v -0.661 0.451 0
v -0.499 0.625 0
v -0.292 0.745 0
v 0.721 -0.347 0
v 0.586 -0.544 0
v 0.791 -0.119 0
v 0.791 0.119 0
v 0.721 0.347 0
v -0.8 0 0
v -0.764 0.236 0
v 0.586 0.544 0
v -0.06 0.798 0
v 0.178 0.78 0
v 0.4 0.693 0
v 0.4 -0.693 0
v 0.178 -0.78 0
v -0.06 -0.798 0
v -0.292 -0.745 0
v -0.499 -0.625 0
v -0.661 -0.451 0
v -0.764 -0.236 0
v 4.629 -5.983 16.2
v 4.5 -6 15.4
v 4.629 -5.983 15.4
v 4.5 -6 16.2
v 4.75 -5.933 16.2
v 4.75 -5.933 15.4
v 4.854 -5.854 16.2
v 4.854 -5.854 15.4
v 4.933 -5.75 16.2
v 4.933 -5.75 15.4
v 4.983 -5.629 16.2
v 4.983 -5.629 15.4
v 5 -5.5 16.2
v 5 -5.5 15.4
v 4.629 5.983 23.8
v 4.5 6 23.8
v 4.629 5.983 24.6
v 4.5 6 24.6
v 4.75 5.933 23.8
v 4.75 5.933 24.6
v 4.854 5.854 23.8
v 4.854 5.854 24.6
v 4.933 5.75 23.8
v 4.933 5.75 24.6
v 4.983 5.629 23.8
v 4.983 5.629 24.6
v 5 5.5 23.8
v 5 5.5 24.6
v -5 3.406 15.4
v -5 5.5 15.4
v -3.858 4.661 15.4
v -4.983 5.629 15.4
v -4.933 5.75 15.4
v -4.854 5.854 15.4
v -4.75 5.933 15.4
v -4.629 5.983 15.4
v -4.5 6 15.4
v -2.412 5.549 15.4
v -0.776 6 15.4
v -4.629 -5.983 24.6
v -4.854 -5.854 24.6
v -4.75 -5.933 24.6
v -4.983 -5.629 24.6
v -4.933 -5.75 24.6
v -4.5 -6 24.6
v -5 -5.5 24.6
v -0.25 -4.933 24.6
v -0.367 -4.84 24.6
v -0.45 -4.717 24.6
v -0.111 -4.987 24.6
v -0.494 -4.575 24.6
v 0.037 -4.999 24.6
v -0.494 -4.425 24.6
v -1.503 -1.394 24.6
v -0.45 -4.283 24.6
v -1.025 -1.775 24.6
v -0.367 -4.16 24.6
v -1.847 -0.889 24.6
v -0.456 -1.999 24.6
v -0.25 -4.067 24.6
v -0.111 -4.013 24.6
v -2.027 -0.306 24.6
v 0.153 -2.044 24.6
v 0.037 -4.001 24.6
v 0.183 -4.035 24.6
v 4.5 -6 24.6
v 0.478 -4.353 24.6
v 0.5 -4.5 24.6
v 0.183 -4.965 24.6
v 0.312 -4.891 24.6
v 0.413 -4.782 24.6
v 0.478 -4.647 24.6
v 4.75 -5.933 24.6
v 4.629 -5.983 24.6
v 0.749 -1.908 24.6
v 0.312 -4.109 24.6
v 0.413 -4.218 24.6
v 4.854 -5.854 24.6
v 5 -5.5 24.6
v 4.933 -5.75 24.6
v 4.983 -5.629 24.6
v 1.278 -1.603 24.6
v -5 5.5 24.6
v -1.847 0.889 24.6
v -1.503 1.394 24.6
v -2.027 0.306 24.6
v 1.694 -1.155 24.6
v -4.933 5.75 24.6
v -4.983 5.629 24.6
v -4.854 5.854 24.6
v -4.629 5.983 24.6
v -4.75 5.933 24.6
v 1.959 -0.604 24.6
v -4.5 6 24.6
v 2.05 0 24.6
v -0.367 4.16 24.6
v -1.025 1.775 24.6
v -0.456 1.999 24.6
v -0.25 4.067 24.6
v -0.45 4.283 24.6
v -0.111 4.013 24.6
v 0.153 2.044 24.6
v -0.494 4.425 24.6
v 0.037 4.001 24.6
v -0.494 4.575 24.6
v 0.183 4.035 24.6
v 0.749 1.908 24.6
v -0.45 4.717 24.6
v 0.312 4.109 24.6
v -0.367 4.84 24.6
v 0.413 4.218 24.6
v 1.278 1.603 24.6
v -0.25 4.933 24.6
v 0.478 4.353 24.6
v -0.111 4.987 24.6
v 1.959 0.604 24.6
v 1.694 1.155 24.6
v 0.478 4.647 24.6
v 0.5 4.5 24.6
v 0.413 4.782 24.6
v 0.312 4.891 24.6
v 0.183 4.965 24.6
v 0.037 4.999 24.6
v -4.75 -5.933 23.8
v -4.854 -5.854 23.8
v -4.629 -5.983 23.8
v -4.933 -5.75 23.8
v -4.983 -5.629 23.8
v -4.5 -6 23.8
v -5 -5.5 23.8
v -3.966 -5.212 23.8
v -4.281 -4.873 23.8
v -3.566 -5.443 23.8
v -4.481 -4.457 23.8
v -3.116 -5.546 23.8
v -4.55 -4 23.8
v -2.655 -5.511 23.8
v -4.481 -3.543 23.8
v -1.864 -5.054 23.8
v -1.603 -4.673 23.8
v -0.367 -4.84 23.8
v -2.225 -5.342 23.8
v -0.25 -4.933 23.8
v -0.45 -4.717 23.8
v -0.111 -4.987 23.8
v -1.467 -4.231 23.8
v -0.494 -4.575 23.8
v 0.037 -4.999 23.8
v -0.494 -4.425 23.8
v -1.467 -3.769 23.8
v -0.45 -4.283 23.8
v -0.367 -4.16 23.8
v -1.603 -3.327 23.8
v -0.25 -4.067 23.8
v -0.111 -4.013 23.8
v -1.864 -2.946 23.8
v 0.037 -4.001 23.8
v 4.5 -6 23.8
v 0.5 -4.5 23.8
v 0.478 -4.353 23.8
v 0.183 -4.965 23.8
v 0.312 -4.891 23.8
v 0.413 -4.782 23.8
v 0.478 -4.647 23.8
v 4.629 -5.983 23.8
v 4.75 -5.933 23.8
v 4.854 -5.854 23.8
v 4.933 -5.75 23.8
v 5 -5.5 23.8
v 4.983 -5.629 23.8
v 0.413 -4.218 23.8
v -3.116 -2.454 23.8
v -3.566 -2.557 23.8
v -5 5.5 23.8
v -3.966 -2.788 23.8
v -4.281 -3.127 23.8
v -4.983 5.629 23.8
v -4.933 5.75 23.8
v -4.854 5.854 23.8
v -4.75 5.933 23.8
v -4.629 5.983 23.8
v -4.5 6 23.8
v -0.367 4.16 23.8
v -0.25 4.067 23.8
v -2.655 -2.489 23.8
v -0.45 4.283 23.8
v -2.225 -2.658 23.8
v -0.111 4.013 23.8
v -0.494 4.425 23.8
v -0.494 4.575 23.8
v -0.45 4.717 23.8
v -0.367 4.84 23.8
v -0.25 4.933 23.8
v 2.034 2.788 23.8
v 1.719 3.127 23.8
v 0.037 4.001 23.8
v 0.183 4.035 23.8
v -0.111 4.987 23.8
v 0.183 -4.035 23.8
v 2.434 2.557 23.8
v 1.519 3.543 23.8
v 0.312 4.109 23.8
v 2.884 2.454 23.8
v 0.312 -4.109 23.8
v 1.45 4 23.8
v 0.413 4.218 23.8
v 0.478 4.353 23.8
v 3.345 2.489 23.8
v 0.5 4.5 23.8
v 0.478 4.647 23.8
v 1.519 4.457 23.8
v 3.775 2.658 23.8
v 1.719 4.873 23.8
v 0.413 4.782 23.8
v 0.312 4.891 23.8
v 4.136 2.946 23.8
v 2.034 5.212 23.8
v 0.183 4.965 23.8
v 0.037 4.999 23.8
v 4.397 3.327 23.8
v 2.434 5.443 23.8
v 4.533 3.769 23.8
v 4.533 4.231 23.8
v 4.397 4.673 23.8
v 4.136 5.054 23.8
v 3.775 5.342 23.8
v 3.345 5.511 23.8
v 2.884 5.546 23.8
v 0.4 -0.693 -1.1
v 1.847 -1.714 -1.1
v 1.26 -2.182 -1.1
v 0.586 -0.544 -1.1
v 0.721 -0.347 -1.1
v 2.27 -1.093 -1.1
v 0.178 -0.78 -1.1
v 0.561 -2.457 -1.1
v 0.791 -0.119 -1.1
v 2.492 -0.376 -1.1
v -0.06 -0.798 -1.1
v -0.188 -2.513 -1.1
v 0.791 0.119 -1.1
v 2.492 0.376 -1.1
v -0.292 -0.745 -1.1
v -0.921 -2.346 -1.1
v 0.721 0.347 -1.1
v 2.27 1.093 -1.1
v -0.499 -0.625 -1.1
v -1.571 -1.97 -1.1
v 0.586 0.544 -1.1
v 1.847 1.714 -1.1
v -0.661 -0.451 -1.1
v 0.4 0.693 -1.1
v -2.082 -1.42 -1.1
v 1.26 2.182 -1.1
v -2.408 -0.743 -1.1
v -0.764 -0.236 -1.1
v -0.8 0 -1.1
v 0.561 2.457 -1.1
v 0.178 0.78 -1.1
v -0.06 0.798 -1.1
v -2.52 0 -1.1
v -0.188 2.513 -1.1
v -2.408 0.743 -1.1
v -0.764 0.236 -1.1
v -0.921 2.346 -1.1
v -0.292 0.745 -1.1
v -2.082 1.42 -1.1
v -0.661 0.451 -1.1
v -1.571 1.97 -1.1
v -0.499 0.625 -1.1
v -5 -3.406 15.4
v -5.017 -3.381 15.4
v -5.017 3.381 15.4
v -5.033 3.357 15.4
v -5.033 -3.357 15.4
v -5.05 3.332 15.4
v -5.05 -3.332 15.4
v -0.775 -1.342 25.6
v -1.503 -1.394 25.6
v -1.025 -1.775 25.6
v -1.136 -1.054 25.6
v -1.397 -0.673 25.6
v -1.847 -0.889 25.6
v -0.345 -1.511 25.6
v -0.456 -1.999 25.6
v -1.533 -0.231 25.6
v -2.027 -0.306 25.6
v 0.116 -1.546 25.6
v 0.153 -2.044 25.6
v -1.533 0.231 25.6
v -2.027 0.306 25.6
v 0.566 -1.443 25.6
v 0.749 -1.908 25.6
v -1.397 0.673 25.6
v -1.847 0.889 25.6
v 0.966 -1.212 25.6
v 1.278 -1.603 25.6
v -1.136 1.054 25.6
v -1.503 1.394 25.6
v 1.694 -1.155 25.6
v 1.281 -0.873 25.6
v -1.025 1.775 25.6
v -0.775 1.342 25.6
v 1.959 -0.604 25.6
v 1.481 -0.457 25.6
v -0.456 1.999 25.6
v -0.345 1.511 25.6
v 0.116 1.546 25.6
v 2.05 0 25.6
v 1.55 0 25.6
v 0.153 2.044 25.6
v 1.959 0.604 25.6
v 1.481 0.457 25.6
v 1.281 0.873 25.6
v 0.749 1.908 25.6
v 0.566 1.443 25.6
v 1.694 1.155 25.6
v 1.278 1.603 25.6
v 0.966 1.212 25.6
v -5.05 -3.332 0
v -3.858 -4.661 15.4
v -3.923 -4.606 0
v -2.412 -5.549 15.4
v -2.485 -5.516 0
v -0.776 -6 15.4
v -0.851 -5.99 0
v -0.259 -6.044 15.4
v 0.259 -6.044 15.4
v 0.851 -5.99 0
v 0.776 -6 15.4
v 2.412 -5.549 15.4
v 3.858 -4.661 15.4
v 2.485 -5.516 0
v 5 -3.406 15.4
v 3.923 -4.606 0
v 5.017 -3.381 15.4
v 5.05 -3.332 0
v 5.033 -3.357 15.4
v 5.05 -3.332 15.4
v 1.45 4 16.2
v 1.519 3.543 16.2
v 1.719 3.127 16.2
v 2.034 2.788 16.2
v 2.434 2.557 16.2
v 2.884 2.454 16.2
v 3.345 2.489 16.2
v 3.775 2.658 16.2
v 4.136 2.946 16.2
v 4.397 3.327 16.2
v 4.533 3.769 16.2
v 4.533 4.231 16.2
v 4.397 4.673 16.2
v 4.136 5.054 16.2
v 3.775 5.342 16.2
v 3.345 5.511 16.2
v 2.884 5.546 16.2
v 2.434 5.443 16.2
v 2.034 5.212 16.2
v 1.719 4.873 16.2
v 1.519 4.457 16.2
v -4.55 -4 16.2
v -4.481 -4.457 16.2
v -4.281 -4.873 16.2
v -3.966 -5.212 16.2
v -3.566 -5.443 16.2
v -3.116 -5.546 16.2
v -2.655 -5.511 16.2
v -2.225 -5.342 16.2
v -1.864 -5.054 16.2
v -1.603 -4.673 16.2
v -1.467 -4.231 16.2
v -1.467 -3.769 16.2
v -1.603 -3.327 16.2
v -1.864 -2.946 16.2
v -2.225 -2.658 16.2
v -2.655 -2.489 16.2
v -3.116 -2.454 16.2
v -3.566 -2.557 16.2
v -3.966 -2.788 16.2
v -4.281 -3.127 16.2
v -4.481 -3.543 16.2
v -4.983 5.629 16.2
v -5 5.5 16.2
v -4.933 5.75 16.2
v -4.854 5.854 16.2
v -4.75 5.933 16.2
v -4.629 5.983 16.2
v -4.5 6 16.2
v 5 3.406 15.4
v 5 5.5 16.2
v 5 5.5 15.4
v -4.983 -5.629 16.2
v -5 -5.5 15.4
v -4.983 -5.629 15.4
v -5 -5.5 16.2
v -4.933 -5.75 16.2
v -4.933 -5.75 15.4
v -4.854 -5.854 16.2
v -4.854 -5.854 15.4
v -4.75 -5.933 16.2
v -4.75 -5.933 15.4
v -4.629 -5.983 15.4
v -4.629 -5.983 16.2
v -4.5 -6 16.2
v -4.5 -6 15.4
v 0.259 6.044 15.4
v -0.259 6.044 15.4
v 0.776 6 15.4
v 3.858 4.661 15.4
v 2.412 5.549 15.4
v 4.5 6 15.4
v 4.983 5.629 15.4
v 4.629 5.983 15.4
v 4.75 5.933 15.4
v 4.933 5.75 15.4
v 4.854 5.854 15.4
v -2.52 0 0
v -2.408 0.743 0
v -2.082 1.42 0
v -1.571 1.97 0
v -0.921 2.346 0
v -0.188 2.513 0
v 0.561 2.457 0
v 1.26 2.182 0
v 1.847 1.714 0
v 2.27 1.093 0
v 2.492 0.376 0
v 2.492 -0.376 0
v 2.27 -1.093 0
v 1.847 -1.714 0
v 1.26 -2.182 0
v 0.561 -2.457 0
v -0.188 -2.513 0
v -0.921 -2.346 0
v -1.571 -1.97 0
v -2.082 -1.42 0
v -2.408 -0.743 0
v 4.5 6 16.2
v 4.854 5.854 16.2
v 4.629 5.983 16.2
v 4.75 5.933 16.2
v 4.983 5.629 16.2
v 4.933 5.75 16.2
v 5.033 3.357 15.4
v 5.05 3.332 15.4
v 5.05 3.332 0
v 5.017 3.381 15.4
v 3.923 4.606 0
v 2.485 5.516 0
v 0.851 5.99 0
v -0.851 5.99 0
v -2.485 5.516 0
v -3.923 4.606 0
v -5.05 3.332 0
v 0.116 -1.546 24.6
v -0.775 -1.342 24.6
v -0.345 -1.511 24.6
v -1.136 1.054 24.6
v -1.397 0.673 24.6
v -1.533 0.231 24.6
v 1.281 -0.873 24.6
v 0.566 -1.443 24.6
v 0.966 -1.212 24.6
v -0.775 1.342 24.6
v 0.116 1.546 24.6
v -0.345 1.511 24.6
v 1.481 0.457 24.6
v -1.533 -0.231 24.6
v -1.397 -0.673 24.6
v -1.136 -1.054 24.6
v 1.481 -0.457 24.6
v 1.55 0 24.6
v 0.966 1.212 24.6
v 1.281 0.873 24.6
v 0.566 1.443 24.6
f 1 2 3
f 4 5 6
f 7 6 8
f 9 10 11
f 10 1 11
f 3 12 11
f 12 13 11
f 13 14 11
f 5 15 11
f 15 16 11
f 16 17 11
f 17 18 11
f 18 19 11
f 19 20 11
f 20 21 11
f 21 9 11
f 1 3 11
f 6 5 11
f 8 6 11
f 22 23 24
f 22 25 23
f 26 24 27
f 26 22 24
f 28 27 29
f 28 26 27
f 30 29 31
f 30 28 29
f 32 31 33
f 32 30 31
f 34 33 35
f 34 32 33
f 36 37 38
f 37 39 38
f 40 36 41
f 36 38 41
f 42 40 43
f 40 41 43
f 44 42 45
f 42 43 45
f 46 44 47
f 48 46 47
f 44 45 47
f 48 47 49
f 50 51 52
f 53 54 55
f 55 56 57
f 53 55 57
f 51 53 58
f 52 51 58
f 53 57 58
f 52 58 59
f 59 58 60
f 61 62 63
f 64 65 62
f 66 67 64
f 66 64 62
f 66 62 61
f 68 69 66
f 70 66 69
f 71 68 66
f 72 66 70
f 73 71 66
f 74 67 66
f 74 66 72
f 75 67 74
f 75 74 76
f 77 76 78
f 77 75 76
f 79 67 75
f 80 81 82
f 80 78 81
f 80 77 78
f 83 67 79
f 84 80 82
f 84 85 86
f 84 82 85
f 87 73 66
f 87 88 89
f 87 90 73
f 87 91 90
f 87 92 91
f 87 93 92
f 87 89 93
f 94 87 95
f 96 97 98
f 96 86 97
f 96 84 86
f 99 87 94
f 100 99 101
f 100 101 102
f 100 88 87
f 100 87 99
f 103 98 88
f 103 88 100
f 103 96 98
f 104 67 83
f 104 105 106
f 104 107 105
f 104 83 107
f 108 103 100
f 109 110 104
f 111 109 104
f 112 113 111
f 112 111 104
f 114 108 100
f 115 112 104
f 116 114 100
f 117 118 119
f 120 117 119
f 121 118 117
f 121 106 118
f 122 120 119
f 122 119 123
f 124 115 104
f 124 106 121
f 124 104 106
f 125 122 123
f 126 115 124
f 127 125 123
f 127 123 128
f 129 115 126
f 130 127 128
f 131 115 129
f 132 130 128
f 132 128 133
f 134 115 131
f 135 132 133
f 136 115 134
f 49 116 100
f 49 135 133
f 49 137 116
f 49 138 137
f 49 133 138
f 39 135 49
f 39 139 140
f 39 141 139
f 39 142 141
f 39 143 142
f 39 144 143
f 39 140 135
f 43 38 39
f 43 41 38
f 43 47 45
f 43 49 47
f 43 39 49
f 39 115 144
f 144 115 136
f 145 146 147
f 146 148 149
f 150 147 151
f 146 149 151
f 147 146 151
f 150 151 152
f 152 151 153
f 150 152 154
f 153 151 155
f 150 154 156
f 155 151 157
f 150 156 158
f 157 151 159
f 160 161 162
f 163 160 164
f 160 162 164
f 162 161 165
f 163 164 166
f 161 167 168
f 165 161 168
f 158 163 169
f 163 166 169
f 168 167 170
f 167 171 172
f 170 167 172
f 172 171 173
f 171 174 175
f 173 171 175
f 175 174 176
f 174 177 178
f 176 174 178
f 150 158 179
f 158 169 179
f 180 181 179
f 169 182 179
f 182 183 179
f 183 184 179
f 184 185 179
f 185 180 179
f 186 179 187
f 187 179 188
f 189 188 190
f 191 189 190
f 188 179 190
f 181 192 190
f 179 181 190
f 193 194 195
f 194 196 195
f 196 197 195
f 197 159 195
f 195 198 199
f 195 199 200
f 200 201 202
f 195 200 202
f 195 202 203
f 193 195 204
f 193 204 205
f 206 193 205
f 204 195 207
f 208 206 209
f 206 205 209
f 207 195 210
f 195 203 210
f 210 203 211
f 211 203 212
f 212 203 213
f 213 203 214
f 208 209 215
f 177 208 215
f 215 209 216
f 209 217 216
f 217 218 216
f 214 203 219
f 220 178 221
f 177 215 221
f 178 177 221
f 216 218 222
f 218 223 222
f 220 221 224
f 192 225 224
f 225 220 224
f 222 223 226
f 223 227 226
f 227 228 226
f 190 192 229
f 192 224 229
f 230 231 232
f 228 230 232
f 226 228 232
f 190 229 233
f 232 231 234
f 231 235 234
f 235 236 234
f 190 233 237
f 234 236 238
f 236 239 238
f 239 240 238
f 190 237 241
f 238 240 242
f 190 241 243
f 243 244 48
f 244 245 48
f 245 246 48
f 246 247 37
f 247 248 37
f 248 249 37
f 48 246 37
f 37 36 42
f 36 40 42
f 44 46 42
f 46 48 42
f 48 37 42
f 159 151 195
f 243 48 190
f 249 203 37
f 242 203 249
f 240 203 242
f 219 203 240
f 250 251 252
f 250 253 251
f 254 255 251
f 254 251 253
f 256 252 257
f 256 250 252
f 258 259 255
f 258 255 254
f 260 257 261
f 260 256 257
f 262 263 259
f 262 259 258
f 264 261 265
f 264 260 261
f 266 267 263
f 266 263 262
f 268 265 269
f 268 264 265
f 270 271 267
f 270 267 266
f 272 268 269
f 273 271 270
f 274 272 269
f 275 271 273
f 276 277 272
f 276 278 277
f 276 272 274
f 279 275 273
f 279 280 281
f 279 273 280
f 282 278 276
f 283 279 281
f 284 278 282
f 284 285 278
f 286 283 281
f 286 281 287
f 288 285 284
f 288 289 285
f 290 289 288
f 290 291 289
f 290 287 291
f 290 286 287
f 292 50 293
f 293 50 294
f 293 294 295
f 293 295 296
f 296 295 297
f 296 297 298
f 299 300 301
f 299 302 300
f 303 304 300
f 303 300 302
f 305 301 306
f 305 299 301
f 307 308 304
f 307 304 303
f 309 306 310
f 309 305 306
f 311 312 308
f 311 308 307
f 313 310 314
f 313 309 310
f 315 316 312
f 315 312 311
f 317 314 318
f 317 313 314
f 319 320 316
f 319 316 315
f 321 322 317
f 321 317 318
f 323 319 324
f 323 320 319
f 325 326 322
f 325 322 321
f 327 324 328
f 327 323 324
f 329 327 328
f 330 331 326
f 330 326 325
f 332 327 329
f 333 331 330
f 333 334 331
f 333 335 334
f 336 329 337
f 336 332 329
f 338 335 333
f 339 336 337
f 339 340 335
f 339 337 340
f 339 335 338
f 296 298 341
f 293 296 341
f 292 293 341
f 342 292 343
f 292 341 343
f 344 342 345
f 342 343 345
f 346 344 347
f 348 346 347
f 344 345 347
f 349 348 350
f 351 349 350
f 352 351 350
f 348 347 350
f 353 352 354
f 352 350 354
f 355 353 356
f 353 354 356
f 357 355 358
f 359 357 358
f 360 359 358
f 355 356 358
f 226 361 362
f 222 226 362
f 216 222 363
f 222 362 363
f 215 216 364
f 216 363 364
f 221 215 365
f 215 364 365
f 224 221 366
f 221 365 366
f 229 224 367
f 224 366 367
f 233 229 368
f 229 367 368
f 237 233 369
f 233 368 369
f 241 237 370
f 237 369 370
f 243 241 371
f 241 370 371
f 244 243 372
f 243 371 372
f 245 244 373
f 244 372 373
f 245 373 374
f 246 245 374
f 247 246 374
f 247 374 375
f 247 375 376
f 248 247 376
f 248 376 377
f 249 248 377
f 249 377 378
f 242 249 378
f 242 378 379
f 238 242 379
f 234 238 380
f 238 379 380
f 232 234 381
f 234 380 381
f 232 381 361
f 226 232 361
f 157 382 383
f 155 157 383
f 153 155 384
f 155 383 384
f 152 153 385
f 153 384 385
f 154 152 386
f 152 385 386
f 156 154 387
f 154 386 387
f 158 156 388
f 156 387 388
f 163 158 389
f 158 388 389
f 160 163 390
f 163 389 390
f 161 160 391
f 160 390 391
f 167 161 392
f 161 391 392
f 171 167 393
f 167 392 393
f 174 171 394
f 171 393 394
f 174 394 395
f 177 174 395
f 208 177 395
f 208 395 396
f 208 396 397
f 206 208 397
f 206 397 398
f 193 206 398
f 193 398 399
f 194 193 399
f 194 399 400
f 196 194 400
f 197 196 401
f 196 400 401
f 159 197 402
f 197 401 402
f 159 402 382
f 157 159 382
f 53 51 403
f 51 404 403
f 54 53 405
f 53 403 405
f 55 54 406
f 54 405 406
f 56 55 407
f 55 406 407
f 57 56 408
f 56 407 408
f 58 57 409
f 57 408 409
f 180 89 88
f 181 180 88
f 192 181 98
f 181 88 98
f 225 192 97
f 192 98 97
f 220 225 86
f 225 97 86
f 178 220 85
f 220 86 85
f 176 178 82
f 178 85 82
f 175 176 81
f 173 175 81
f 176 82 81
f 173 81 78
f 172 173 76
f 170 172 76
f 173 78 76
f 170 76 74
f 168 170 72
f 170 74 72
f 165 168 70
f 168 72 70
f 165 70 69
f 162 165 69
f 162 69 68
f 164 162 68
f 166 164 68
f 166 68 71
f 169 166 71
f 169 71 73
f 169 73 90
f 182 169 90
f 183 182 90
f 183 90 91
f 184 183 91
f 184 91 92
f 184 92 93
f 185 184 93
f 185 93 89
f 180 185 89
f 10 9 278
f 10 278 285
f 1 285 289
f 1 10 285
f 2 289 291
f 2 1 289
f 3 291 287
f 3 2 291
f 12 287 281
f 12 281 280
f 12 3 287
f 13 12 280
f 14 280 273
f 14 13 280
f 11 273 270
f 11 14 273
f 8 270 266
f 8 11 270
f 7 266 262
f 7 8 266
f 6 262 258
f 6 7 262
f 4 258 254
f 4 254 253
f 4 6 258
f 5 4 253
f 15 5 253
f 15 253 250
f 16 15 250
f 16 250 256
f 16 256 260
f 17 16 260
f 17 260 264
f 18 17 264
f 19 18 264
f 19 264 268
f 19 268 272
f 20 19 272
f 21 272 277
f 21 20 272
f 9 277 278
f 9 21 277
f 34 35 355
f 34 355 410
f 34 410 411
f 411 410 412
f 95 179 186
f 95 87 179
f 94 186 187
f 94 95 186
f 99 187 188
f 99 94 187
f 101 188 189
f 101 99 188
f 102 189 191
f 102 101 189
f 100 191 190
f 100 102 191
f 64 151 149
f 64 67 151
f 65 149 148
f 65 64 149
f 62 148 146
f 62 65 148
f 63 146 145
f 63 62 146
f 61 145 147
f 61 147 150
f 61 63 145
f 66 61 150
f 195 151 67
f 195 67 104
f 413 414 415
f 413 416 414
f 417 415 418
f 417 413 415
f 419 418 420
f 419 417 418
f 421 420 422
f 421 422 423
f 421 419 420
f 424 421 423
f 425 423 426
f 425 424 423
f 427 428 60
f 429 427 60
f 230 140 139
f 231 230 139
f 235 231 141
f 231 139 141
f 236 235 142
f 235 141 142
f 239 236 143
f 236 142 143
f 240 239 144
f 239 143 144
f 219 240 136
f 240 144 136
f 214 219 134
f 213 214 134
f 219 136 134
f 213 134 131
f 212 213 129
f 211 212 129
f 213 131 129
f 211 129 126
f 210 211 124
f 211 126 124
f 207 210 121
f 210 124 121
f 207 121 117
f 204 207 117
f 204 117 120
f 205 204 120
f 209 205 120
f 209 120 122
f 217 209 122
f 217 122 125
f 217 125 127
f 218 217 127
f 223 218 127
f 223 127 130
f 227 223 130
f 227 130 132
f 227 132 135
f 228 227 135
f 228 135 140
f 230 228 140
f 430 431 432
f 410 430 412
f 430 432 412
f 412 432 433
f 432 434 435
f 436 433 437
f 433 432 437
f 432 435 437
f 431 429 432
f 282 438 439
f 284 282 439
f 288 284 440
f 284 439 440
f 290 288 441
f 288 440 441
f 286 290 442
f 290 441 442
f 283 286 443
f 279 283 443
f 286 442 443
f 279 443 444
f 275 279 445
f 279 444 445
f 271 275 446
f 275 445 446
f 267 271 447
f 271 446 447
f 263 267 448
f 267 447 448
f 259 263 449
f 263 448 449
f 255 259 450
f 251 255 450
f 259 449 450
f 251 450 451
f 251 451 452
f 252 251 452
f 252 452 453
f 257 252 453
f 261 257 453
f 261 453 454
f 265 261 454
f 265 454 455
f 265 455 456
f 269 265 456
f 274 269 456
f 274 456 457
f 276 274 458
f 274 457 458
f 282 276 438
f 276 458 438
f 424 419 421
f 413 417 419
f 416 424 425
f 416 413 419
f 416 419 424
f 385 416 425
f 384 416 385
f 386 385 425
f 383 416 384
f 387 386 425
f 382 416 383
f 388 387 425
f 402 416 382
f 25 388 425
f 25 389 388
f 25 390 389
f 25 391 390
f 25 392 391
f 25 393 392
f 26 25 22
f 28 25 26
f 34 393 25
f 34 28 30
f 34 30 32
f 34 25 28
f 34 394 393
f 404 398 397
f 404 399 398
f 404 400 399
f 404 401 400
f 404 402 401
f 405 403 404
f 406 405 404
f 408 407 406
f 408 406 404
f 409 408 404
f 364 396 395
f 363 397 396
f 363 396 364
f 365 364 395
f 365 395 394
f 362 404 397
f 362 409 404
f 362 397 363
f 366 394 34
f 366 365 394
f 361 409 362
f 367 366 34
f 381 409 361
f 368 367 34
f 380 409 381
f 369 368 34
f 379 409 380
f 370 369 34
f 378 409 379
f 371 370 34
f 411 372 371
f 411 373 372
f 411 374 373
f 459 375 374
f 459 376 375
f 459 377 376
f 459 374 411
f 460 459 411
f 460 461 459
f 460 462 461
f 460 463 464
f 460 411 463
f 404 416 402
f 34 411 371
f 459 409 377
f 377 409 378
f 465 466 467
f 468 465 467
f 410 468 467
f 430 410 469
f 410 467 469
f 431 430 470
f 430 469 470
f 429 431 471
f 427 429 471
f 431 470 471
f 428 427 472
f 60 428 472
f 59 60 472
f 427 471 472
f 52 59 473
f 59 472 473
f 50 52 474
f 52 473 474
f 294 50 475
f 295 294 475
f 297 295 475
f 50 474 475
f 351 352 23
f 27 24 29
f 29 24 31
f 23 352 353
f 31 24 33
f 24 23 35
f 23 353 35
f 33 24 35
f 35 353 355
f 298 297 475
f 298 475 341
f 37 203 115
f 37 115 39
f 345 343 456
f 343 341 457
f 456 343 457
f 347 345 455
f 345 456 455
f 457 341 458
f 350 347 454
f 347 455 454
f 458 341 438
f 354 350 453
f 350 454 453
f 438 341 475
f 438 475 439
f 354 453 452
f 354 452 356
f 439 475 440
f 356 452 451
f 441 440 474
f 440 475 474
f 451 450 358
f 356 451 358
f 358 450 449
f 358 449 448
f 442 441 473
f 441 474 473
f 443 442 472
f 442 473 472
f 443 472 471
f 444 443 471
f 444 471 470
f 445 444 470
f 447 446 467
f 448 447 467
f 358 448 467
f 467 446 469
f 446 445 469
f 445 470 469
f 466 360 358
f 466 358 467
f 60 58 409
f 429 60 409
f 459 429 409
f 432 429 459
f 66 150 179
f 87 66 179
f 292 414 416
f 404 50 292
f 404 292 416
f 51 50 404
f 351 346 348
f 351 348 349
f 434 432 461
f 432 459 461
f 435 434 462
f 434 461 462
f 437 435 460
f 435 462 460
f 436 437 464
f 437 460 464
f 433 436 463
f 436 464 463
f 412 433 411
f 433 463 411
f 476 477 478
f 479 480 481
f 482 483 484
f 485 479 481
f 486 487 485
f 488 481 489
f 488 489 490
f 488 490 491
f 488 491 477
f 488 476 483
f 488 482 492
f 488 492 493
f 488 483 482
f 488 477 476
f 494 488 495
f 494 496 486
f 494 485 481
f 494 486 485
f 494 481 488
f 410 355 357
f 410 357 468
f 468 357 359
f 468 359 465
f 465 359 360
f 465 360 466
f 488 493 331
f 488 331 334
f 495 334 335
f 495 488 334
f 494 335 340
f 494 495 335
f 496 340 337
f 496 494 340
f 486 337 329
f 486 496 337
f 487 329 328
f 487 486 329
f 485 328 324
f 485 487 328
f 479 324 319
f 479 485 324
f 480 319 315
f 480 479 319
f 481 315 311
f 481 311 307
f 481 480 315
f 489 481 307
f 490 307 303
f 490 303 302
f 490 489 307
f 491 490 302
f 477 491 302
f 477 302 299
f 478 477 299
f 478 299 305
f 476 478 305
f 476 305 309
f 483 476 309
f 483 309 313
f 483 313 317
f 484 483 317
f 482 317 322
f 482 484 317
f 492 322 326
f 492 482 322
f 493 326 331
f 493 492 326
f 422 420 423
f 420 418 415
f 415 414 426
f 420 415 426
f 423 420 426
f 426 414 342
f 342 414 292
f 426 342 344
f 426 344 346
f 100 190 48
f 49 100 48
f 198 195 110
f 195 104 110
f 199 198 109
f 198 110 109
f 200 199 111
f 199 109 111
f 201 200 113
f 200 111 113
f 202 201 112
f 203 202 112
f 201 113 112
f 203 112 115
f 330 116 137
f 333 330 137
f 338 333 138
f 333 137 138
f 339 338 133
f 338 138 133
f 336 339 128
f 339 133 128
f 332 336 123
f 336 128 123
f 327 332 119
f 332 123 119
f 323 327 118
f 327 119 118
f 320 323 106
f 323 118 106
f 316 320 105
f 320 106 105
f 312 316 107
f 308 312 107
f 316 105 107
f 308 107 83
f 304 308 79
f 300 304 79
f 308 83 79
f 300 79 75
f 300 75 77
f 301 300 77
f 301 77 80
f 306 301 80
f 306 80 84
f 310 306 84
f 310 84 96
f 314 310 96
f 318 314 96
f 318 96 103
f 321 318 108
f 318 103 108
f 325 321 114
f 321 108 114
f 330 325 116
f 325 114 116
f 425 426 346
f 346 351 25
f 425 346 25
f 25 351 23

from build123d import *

# Parameters (mm, degrees)
EXTRUDE_1_DEPTH     = 15.4
SKETCH_2_R          = 2.52
SKETCH_2_R_2        = 0.8
EXTRUDE_2_DEPTH     = 1.1
SKETCH_5_W          = 10
SKETCH_5_H          = 12
EXTRUDE_3_DEPTH     = 0.8
SKETCH_7_R          = 1.55
EXTRUDE_4_DEPTH     = 7.6
SKETCH_8_W          = 10
SKETCH_8_H          = 12
EXTRUDE_5_DEPTH     = 0.8
SKETCH_9_R          = 2.05
SKETCH_9_R_2        = 1.55
EXTRUDE_6_DEPTH     = 1
FILLET_1_R          = 0.5
CUT_EXTRUDE_1_REACH = 28.881
SKETCH_10_R         = 0.5


with BuildPart() as part:
    # Эскиз1 → Бобышка-Вытянуть1 (new body)
    with BuildSketch(Plane.XY):
        with BuildLine():
            Line((5.05, -3.33166625), (5.05, 3.33166625))
            ThreePointArc((5.05, 3.33166625), (0, 6.05), (-5.05, 3.33166625))
            Line((-5.05, 3.33166625), (-5.05, -3.33166625))
            ThreePointArc((-5.05, -3.33166625), (0, -6.05), (5.05, -3.33166625))
        make_face()
    extrude(amount=EXTRUDE_1_DEPTH)

    # Эскиз2 → Бобышка-Вытянуть2 (add)
    with BuildSketch(Plane(origin=(0, 0, 0), x_dir=(-1, 0, 0), z_dir=(0, 0, -1))):
        Circle(SKETCH_2_R)
        Circle(SKETCH_2_R_2, mode=Mode.SUBTRACT)
    extrude(amount=EXTRUDE_2_DEPTH)

    # Эскиз5 → Бобышка-Вытянуть3 (add)
    with BuildSketch(Plane.XY.offset(15.4)):
        Rectangle(SKETCH_5_W, SKETCH_5_H)
    extrude(amount=EXTRUDE_3_DEPTH)

    # Эскиз7 → Бобышка-Вытянуть4 (add)
    with BuildSketch(Plane.XY.offset(16.2)):
        with Locations(Location((3, 4, 0), (0, 0, 180))):
            Circle(SKETCH_7_R)
        with Locations(Location((-3, -4, 0), (0, 0, 180))):
            Circle(SKETCH_7_R)
    extrude(amount=EXTRUDE_4_DEPTH)

    # Эскиз8 → Бобышка-Вытянуть5 (add)
    with BuildSketch(Plane.XY.offset(23.8)):
        Rectangle(SKETCH_8_W, SKETCH_8_H)
    extrude(amount=EXTRUDE_5_DEPTH)

    # Эскиз9 → Бобышка-Вытянуть6 (add)
    with BuildSketch(Plane.XY.offset(24.6)):
        Circle(SKETCH_9_R)
        Circle(SKETCH_9_R_2, mode=Mode.SUBTRACT)
    extrude(amount=EXTRUDE_6_DEPTH)

    # Скругление1
    fillet_1_edges = [part.edges().sort_by_distance(p)[0] for p in [
        (-5, 6, 15.8),
        (-5, -6, 15.8),
        (5, -6, 15.8),
        (5, 6, 15.8),
        (5, 6, 24.2),
        (-5, 6, 24.2),
        (-5, -6, 24.2),
        (5, -6, 24.2),
    ]]
    fillet(fillet_1_edges, radius=FILLET_1_R)

    # Эскиз10 → Вырез-Вытянуть1 (cut, up to next)
    with BuildSketch(Plane.XY.offset(24.6), mode=Mode.PRIVATE) as cut_extrude_1_sk1:
        with Locations((0, -4.5)):
            Circle(SKETCH_10_R)
    cut_extrude_1_tool1 = extrude(cut_extrude_1_sk1.sketch, amount=-CUT_EXTRUDE_1_REACH, mode=Mode.PRIVATE) & part.part
    # Эскиз10 → Вырез-Вытянуть1 (cut, up to next)
    with BuildSketch(Plane.XY.offset(24.6), mode=Mode.PRIVATE) as cut_extrude_1_sk2:
        with Locations((0, 4.5)):
            Circle(SKETCH_10_R)
    cut_extrude_1_tool2 = extrude(cut_extrude_1_sk2.sketch, amount=-CUT_EXTRUDE_1_REACH, mode=Mode.PRIVATE) & part.part
    add(cut_extrude_1_tool1.solids().sort_by_distance((0, -4.5, 24.6))[0], mode=Mode.SUBTRACT)
    add(cut_extrude_1_tool2.solids().sort_by_distance((0, 4.5, 24.6))[0], mode=Mode.SUBTRACT)


solid = part.part
